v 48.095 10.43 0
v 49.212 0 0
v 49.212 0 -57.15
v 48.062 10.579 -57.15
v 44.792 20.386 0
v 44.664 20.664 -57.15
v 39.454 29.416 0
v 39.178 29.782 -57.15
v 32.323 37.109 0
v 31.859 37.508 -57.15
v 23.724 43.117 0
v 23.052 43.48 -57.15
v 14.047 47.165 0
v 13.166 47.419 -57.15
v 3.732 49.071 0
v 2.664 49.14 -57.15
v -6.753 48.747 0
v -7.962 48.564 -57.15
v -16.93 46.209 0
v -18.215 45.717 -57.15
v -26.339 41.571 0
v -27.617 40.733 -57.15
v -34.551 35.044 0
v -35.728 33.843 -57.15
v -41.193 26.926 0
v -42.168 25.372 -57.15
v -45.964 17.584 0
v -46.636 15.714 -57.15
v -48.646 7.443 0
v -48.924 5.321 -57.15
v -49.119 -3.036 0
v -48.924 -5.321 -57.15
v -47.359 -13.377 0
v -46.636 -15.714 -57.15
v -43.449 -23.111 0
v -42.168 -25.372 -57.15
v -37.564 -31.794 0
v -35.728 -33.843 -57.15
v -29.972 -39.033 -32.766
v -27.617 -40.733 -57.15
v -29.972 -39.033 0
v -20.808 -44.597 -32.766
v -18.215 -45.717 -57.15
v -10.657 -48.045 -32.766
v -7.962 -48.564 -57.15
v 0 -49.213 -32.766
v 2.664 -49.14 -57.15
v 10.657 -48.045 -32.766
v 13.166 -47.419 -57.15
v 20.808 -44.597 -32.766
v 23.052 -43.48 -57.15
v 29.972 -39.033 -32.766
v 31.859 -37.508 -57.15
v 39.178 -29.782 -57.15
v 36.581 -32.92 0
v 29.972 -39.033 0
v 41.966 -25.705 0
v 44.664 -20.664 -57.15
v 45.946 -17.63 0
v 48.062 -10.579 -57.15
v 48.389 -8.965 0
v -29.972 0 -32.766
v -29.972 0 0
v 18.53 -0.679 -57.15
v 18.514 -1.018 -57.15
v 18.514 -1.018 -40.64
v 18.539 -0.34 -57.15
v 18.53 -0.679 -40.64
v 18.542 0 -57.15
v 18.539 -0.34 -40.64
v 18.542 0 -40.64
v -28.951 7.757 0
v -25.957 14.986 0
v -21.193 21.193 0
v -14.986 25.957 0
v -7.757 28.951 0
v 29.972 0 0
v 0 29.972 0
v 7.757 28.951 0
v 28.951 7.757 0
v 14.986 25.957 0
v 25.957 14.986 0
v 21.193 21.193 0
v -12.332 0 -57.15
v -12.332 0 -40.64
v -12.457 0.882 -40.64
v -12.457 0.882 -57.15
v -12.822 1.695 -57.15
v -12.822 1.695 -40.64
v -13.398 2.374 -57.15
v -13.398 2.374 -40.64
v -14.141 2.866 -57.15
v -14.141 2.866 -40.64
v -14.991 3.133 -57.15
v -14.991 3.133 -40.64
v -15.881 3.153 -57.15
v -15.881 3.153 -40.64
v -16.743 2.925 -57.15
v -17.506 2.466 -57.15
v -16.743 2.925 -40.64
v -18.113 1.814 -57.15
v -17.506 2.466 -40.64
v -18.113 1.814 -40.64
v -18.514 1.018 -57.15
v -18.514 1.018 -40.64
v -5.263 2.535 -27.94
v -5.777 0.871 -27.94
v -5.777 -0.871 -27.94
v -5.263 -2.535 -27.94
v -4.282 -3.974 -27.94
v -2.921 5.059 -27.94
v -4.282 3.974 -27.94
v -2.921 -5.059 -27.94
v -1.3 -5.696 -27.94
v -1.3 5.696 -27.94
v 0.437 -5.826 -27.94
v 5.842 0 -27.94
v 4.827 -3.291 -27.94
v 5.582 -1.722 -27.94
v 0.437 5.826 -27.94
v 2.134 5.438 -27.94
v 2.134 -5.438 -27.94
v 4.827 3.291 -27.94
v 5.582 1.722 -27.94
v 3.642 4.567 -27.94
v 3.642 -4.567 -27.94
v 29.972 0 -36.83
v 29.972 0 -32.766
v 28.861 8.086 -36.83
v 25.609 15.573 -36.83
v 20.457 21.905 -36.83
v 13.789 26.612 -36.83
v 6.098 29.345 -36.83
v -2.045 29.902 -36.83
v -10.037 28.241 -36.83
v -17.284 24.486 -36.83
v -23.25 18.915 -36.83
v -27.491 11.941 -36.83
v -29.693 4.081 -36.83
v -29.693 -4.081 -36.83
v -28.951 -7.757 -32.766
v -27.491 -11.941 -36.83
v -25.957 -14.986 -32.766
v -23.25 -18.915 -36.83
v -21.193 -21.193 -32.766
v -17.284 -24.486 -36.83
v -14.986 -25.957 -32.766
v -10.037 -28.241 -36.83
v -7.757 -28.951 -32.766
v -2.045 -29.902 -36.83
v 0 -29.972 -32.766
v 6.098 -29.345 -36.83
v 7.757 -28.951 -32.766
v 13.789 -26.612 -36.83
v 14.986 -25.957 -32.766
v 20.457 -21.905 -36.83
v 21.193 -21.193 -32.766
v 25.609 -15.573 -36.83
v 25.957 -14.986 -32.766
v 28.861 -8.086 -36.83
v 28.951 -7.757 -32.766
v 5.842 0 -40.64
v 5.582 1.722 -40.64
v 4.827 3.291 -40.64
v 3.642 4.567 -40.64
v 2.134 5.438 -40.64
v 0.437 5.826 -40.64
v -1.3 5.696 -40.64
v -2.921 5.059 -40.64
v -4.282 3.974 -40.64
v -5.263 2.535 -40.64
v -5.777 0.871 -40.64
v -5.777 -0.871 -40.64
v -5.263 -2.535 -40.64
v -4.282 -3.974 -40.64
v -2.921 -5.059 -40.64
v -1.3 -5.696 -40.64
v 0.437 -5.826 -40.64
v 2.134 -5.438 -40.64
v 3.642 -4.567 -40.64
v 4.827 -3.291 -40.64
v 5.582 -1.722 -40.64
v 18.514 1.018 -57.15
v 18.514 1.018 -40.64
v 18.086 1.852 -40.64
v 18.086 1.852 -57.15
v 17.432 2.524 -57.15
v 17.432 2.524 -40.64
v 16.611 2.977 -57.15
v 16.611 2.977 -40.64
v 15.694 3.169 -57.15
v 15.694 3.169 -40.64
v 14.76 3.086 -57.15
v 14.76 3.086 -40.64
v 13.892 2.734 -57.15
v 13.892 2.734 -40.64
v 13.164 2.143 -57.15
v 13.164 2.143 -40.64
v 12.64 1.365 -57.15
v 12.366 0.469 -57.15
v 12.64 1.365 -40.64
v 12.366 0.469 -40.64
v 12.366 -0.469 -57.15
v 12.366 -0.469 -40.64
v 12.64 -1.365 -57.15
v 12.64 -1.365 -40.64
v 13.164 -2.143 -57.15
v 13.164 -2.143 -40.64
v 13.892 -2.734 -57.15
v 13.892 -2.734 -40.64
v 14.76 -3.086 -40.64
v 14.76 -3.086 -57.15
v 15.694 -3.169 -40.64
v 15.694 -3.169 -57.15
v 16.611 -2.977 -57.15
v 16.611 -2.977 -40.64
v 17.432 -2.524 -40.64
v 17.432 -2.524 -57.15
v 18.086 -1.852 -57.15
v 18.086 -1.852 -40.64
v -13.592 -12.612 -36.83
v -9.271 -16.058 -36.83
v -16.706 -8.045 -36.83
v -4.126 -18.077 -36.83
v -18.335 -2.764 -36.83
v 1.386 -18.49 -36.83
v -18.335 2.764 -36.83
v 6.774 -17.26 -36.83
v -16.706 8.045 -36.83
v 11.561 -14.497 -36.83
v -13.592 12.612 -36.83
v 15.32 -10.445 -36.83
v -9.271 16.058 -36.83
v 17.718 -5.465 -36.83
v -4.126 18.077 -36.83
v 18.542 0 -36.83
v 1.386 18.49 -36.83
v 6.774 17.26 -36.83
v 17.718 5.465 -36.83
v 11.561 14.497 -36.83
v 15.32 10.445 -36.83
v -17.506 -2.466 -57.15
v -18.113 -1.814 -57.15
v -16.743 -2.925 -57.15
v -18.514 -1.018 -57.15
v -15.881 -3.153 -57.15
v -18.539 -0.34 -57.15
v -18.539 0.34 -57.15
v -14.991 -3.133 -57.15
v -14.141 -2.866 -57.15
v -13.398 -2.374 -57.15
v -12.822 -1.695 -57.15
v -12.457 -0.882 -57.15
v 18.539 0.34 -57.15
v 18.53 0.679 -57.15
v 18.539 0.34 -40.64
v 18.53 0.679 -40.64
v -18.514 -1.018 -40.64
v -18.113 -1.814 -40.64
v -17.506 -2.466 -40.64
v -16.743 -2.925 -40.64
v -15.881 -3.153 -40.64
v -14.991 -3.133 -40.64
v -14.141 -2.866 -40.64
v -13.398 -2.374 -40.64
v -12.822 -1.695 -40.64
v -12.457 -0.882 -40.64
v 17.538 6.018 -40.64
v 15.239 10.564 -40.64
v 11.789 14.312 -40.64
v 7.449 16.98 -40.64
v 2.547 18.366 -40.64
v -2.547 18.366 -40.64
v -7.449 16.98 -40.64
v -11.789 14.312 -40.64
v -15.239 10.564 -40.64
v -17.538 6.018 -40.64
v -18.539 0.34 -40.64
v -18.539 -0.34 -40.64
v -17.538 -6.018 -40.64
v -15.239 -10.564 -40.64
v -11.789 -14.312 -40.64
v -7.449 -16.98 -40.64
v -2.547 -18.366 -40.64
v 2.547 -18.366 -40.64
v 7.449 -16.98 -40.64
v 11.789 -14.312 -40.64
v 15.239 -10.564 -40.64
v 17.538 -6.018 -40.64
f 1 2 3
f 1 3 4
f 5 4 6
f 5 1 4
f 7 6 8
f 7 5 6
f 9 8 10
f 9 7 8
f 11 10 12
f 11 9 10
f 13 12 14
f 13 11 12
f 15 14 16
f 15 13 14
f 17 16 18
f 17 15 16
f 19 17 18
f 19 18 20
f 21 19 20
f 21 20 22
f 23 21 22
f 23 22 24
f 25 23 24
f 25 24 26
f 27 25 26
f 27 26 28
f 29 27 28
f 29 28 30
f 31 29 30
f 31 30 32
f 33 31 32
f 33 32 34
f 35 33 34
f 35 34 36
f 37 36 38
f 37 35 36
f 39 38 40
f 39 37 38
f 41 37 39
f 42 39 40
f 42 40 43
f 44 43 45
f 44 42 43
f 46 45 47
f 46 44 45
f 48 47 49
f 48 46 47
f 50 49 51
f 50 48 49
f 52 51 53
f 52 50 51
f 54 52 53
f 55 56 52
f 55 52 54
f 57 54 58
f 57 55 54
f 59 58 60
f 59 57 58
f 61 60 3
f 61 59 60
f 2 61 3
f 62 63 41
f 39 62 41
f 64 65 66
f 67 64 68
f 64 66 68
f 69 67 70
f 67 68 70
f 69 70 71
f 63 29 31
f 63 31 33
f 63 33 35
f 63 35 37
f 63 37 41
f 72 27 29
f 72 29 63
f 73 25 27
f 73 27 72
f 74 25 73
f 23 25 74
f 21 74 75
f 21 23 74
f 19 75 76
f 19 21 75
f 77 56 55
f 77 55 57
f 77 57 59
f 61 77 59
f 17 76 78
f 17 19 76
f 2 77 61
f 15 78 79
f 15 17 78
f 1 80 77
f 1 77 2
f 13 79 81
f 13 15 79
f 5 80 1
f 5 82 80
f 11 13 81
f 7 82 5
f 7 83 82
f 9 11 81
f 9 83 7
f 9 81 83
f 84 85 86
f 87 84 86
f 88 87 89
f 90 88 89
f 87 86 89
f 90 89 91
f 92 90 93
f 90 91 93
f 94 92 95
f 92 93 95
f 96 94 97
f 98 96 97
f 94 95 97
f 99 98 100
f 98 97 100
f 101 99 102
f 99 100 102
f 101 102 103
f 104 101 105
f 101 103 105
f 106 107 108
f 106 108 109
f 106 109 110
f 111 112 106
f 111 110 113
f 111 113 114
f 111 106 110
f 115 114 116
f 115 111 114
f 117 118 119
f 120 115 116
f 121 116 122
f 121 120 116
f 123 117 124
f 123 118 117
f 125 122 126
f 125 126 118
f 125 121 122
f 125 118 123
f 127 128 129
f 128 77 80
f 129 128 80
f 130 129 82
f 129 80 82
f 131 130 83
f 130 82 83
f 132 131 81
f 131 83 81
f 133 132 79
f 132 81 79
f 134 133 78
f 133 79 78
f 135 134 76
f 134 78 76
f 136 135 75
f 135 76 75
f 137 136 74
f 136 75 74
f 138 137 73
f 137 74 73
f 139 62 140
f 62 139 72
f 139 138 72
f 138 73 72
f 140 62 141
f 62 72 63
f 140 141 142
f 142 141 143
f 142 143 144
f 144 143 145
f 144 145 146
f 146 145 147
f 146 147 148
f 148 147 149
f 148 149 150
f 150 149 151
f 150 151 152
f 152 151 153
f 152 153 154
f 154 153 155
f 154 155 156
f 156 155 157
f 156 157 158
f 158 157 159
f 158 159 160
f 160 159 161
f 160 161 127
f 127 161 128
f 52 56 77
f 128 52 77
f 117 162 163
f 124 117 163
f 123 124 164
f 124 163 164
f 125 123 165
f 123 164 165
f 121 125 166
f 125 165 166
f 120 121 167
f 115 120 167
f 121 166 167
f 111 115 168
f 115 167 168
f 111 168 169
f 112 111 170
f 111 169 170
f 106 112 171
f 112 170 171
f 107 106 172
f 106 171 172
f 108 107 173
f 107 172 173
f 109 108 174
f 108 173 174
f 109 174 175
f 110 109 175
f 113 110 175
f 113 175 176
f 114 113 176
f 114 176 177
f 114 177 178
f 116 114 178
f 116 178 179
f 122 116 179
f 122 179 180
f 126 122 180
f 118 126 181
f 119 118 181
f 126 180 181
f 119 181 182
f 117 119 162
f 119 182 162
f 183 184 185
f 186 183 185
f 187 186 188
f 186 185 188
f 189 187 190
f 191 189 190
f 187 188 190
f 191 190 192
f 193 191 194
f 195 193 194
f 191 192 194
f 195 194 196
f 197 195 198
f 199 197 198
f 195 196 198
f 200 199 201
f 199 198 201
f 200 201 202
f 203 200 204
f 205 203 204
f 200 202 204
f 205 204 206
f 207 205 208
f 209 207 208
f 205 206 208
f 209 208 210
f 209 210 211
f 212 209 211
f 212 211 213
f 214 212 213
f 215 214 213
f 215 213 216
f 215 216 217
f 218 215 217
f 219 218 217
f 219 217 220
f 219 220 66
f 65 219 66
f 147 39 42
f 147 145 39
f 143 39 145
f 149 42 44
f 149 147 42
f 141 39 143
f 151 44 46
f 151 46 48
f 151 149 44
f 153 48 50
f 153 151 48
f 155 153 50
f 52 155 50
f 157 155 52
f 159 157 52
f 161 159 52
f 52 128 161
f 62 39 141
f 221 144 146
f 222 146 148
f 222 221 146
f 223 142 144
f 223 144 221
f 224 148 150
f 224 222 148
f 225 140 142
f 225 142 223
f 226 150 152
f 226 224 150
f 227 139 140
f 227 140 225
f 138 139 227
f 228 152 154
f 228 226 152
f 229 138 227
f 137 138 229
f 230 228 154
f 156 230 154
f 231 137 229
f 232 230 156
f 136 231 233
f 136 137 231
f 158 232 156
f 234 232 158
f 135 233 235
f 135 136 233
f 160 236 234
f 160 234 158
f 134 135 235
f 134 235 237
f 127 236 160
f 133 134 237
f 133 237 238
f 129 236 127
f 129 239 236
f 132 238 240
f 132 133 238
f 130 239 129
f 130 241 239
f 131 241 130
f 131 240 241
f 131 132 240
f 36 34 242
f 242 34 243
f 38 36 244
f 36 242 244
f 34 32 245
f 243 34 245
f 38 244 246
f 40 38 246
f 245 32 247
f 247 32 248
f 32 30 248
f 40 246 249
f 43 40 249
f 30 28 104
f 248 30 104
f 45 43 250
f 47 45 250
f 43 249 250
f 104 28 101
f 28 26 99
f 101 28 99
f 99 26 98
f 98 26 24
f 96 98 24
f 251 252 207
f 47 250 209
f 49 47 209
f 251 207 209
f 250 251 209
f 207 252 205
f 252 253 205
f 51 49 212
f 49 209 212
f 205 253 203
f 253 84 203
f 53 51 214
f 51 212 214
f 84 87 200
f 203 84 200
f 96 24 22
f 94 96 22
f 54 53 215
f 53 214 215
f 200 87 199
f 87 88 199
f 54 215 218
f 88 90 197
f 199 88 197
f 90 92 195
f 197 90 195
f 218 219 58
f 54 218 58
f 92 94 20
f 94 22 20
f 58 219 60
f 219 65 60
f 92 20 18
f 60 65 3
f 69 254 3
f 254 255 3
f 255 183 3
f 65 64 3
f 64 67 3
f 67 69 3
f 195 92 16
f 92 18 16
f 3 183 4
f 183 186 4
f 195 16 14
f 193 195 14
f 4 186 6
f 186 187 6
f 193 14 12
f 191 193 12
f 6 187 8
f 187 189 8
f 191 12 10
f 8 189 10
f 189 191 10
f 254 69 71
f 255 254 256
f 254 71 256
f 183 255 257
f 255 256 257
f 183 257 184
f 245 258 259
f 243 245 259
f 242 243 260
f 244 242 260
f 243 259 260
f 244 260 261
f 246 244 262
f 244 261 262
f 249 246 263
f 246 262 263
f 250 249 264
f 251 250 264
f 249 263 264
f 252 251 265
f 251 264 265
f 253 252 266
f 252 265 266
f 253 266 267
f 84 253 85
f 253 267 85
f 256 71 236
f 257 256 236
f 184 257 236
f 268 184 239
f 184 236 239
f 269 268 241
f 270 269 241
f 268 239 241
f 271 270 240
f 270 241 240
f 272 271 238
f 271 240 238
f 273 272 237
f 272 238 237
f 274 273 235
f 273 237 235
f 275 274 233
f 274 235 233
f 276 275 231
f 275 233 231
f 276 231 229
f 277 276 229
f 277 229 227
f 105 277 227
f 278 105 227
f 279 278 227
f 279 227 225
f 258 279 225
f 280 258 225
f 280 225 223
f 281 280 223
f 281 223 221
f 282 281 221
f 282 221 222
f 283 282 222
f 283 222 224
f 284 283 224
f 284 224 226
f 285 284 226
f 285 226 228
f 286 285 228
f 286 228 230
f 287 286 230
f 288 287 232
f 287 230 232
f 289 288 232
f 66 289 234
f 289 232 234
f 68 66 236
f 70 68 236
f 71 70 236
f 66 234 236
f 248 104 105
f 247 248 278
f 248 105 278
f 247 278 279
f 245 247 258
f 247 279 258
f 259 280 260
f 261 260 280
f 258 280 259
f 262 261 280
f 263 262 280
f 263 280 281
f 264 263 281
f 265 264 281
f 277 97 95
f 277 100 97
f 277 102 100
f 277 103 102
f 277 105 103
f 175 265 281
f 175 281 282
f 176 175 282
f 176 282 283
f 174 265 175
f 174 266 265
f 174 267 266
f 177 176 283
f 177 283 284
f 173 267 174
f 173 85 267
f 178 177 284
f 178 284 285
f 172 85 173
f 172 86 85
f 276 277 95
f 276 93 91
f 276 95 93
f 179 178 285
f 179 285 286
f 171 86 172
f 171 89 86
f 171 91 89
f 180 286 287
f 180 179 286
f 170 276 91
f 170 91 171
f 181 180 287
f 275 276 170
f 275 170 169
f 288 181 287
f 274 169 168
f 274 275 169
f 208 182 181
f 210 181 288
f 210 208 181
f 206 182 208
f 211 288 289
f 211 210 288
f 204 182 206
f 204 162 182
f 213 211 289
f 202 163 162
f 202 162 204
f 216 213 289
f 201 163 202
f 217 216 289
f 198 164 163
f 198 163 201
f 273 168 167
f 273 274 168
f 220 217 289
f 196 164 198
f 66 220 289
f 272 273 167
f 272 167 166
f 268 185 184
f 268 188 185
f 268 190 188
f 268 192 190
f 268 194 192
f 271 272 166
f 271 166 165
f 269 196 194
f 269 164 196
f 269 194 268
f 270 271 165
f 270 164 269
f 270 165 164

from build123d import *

# Parameters (mm, degrees)
F0_R     = 49.2125
F1_DEPTH = 57.15
F2_R     = 18.542
F3_DEPTH = 40.64
F4_DEPTH = 36.83
F5_DEPTH = 32.766
F6_R     = 5.842
F7_DEPTH = 12.7
F9_DEPTH = 16.511


with BuildPart() as f1:
    # F0 (on Top) → F1 (new body)
    with BuildSketch(Plane.XY):
        Circle(F0_R)
    extrude(amount=-F1_DEPTH)

    # F2 (on face) → F3 (cut)
    with BuildSketch(Plane.XY):
        Circle(F2_R)
    extrude(amount=-F3_DEPTH, mode=Mode.SUBTRACT)

    # F2 (on face) → F4 (cut)
    with BuildSketch(Plane.XY):
        with BuildLine():
            ThreePointArc((-29.972, 0), (0, -29.972), (29.972, 0))
            ThreePointArc((29.972, 0), (0, 29.972), (-29.972, 0))
        make_face()
        Circle(F2_R, mode=Mode.SUBTRACT)
    extrude(amount=-F4_DEPTH, mode=Mode.SUBTRACT)

    # F2 (on face) → F5 (cut)
    with BuildSketch(Plane.XY):
        with BuildLine():
            Line((29.972, -39.0326705754), (29.972, 0))
            ThreePointArc((29.972, 0), (0, -29.972), (-29.972, 0))
            Line((-29.972, 0), (-29.972, -39.0326705754))
            ThreePointArc((-29.972, -39.0326705754), (0, -49.2125), (29.972, -39.0326705754))
        make_face()
    extrude(amount=-F5_DEPTH, mode=Mode.SUBTRACT)

    # F6 (on face) → F7 (join)
    with BuildSketch(Plane.XY.offset(-40.64)):
        Circle(F6_R)
    extrude(amount=F7_DEPTH)

    # F8 (on face) → F9 (cut, through all)
    with BuildSketch(Plane.XY.offset(-40.64)):
        with BuildLine():
            ThreePointArc((-18.5140256757, -1.0181440372), (-14.9907707511, -3.1328009848), (-12.3317, 0))
            ThreePointArc((-12.3317, 0), (-14.9907707511, 3.1328009848), (-18.5140256757, 1.0181440372))
            ThreePointArc((-18.5140256757, 1.0181440372), (-18.542, 0), (-18.5140256757, -1.0181440372))
        make_face()
        with BuildLine():
            ThreePointArc((18.542, 0), (18.5350050995, 0.5092641366), (18.5140256757, 1.0181440372))
            ThreePointArc((18.5140256757, 1.0181440372), (12.3317, 0), (18.5140256757, -1.0181440372))
            ThreePointArc((18.5140256757, -1.0181440372), (18.5350050995, -0.5092641366), (18.542, 0))
        make_face()
    extrude(amount=-F9_DEPTH, mode=Mode.SUBTRACT)


solid = f1.part
